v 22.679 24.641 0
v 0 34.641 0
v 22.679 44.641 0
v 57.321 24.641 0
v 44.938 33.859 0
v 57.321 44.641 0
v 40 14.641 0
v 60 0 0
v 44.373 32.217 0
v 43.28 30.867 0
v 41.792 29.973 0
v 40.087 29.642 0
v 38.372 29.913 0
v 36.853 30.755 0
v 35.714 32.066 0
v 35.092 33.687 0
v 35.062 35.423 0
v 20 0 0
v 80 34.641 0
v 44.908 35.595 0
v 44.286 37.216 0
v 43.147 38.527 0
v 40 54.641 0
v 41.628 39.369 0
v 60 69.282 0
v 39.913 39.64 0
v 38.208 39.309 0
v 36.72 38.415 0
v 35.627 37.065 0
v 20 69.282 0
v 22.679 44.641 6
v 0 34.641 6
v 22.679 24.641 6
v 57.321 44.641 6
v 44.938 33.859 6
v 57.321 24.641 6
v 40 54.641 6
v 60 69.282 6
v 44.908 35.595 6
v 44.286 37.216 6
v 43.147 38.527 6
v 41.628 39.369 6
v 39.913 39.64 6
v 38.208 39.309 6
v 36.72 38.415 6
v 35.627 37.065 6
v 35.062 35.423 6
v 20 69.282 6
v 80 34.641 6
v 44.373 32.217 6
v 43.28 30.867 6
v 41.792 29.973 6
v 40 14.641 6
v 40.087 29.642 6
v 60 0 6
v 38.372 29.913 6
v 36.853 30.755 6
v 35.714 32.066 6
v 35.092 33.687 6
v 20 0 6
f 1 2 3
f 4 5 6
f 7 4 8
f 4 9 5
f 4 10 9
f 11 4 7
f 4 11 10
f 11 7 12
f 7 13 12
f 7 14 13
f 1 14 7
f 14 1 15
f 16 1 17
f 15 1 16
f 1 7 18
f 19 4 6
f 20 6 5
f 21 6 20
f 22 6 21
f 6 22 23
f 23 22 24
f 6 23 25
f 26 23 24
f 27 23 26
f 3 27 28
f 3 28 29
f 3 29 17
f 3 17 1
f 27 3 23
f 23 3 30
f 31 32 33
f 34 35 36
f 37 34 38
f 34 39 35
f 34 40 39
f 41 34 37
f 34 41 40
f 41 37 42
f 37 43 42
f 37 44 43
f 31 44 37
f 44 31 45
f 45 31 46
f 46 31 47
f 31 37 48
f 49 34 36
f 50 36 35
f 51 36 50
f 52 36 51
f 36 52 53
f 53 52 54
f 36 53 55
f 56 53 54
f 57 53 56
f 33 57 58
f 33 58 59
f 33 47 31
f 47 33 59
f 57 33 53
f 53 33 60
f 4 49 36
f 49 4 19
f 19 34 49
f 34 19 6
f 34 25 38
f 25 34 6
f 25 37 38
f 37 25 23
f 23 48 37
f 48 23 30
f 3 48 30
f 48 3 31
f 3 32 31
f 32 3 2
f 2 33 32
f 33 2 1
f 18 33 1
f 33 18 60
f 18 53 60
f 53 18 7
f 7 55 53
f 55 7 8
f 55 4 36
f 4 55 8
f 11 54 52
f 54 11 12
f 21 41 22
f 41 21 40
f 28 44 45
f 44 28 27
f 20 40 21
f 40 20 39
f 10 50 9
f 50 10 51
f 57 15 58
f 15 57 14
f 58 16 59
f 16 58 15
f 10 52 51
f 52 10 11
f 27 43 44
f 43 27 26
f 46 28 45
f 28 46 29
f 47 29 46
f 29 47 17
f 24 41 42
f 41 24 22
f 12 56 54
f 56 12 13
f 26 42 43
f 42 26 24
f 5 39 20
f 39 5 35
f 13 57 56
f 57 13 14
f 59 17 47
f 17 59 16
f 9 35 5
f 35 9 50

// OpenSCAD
$fn = 32;

// ----------------------------------------------------------------------
// Star wheel: 6-point star, R40
// ----------------------------------------------------------------------

// --- parameters (mm) ---
n_points = 6;             // number of points / teeth
r_out = 40;               // tip radius
r_in = 20;                // root radius
bore_r = 5;               // centre bore radius
plate_t = 6;              // plate thickness, Z (extrusion height)
bore_d = 10;              // centre bore diameter

profile = [[80, 34.641], [57.321, 44.641], [60, 69.282], [40, 54.641], [20, 69.282], [22.679, 44.641], [0, 34.641], [22.679, 24.641], [20, 0], [40, 14.641], [60, 0], [57.321, 24.641]];  // primary outline, 12 points, counter clockwise
void_1 = [[44.908, 35.595], [44.286, 37.216], [43.147, 38.527], [41.628, 39.369], [39.913, 39.64], [38.208, 39.309], [36.72, 38.415], [35.627, 37.065], [35.062, 35.423], [35.092, 33.687], [35.714, 32.066], [36.853, 30.755], [38.372, 29.913], [40.087, 29.642], [41.792, 29.973], [43.28, 30.867], [44.373, 32.217], [44.938, 33.859]];  // centre bore, 18 points

// --- the one profile operation ---
difference() {
  linear_extrude(height = plate_t) polygon(points = profile);
  translate([0, 0, -1])
    linear_extrude(height = plate_t + 2) polygon(points = void_1);
}
